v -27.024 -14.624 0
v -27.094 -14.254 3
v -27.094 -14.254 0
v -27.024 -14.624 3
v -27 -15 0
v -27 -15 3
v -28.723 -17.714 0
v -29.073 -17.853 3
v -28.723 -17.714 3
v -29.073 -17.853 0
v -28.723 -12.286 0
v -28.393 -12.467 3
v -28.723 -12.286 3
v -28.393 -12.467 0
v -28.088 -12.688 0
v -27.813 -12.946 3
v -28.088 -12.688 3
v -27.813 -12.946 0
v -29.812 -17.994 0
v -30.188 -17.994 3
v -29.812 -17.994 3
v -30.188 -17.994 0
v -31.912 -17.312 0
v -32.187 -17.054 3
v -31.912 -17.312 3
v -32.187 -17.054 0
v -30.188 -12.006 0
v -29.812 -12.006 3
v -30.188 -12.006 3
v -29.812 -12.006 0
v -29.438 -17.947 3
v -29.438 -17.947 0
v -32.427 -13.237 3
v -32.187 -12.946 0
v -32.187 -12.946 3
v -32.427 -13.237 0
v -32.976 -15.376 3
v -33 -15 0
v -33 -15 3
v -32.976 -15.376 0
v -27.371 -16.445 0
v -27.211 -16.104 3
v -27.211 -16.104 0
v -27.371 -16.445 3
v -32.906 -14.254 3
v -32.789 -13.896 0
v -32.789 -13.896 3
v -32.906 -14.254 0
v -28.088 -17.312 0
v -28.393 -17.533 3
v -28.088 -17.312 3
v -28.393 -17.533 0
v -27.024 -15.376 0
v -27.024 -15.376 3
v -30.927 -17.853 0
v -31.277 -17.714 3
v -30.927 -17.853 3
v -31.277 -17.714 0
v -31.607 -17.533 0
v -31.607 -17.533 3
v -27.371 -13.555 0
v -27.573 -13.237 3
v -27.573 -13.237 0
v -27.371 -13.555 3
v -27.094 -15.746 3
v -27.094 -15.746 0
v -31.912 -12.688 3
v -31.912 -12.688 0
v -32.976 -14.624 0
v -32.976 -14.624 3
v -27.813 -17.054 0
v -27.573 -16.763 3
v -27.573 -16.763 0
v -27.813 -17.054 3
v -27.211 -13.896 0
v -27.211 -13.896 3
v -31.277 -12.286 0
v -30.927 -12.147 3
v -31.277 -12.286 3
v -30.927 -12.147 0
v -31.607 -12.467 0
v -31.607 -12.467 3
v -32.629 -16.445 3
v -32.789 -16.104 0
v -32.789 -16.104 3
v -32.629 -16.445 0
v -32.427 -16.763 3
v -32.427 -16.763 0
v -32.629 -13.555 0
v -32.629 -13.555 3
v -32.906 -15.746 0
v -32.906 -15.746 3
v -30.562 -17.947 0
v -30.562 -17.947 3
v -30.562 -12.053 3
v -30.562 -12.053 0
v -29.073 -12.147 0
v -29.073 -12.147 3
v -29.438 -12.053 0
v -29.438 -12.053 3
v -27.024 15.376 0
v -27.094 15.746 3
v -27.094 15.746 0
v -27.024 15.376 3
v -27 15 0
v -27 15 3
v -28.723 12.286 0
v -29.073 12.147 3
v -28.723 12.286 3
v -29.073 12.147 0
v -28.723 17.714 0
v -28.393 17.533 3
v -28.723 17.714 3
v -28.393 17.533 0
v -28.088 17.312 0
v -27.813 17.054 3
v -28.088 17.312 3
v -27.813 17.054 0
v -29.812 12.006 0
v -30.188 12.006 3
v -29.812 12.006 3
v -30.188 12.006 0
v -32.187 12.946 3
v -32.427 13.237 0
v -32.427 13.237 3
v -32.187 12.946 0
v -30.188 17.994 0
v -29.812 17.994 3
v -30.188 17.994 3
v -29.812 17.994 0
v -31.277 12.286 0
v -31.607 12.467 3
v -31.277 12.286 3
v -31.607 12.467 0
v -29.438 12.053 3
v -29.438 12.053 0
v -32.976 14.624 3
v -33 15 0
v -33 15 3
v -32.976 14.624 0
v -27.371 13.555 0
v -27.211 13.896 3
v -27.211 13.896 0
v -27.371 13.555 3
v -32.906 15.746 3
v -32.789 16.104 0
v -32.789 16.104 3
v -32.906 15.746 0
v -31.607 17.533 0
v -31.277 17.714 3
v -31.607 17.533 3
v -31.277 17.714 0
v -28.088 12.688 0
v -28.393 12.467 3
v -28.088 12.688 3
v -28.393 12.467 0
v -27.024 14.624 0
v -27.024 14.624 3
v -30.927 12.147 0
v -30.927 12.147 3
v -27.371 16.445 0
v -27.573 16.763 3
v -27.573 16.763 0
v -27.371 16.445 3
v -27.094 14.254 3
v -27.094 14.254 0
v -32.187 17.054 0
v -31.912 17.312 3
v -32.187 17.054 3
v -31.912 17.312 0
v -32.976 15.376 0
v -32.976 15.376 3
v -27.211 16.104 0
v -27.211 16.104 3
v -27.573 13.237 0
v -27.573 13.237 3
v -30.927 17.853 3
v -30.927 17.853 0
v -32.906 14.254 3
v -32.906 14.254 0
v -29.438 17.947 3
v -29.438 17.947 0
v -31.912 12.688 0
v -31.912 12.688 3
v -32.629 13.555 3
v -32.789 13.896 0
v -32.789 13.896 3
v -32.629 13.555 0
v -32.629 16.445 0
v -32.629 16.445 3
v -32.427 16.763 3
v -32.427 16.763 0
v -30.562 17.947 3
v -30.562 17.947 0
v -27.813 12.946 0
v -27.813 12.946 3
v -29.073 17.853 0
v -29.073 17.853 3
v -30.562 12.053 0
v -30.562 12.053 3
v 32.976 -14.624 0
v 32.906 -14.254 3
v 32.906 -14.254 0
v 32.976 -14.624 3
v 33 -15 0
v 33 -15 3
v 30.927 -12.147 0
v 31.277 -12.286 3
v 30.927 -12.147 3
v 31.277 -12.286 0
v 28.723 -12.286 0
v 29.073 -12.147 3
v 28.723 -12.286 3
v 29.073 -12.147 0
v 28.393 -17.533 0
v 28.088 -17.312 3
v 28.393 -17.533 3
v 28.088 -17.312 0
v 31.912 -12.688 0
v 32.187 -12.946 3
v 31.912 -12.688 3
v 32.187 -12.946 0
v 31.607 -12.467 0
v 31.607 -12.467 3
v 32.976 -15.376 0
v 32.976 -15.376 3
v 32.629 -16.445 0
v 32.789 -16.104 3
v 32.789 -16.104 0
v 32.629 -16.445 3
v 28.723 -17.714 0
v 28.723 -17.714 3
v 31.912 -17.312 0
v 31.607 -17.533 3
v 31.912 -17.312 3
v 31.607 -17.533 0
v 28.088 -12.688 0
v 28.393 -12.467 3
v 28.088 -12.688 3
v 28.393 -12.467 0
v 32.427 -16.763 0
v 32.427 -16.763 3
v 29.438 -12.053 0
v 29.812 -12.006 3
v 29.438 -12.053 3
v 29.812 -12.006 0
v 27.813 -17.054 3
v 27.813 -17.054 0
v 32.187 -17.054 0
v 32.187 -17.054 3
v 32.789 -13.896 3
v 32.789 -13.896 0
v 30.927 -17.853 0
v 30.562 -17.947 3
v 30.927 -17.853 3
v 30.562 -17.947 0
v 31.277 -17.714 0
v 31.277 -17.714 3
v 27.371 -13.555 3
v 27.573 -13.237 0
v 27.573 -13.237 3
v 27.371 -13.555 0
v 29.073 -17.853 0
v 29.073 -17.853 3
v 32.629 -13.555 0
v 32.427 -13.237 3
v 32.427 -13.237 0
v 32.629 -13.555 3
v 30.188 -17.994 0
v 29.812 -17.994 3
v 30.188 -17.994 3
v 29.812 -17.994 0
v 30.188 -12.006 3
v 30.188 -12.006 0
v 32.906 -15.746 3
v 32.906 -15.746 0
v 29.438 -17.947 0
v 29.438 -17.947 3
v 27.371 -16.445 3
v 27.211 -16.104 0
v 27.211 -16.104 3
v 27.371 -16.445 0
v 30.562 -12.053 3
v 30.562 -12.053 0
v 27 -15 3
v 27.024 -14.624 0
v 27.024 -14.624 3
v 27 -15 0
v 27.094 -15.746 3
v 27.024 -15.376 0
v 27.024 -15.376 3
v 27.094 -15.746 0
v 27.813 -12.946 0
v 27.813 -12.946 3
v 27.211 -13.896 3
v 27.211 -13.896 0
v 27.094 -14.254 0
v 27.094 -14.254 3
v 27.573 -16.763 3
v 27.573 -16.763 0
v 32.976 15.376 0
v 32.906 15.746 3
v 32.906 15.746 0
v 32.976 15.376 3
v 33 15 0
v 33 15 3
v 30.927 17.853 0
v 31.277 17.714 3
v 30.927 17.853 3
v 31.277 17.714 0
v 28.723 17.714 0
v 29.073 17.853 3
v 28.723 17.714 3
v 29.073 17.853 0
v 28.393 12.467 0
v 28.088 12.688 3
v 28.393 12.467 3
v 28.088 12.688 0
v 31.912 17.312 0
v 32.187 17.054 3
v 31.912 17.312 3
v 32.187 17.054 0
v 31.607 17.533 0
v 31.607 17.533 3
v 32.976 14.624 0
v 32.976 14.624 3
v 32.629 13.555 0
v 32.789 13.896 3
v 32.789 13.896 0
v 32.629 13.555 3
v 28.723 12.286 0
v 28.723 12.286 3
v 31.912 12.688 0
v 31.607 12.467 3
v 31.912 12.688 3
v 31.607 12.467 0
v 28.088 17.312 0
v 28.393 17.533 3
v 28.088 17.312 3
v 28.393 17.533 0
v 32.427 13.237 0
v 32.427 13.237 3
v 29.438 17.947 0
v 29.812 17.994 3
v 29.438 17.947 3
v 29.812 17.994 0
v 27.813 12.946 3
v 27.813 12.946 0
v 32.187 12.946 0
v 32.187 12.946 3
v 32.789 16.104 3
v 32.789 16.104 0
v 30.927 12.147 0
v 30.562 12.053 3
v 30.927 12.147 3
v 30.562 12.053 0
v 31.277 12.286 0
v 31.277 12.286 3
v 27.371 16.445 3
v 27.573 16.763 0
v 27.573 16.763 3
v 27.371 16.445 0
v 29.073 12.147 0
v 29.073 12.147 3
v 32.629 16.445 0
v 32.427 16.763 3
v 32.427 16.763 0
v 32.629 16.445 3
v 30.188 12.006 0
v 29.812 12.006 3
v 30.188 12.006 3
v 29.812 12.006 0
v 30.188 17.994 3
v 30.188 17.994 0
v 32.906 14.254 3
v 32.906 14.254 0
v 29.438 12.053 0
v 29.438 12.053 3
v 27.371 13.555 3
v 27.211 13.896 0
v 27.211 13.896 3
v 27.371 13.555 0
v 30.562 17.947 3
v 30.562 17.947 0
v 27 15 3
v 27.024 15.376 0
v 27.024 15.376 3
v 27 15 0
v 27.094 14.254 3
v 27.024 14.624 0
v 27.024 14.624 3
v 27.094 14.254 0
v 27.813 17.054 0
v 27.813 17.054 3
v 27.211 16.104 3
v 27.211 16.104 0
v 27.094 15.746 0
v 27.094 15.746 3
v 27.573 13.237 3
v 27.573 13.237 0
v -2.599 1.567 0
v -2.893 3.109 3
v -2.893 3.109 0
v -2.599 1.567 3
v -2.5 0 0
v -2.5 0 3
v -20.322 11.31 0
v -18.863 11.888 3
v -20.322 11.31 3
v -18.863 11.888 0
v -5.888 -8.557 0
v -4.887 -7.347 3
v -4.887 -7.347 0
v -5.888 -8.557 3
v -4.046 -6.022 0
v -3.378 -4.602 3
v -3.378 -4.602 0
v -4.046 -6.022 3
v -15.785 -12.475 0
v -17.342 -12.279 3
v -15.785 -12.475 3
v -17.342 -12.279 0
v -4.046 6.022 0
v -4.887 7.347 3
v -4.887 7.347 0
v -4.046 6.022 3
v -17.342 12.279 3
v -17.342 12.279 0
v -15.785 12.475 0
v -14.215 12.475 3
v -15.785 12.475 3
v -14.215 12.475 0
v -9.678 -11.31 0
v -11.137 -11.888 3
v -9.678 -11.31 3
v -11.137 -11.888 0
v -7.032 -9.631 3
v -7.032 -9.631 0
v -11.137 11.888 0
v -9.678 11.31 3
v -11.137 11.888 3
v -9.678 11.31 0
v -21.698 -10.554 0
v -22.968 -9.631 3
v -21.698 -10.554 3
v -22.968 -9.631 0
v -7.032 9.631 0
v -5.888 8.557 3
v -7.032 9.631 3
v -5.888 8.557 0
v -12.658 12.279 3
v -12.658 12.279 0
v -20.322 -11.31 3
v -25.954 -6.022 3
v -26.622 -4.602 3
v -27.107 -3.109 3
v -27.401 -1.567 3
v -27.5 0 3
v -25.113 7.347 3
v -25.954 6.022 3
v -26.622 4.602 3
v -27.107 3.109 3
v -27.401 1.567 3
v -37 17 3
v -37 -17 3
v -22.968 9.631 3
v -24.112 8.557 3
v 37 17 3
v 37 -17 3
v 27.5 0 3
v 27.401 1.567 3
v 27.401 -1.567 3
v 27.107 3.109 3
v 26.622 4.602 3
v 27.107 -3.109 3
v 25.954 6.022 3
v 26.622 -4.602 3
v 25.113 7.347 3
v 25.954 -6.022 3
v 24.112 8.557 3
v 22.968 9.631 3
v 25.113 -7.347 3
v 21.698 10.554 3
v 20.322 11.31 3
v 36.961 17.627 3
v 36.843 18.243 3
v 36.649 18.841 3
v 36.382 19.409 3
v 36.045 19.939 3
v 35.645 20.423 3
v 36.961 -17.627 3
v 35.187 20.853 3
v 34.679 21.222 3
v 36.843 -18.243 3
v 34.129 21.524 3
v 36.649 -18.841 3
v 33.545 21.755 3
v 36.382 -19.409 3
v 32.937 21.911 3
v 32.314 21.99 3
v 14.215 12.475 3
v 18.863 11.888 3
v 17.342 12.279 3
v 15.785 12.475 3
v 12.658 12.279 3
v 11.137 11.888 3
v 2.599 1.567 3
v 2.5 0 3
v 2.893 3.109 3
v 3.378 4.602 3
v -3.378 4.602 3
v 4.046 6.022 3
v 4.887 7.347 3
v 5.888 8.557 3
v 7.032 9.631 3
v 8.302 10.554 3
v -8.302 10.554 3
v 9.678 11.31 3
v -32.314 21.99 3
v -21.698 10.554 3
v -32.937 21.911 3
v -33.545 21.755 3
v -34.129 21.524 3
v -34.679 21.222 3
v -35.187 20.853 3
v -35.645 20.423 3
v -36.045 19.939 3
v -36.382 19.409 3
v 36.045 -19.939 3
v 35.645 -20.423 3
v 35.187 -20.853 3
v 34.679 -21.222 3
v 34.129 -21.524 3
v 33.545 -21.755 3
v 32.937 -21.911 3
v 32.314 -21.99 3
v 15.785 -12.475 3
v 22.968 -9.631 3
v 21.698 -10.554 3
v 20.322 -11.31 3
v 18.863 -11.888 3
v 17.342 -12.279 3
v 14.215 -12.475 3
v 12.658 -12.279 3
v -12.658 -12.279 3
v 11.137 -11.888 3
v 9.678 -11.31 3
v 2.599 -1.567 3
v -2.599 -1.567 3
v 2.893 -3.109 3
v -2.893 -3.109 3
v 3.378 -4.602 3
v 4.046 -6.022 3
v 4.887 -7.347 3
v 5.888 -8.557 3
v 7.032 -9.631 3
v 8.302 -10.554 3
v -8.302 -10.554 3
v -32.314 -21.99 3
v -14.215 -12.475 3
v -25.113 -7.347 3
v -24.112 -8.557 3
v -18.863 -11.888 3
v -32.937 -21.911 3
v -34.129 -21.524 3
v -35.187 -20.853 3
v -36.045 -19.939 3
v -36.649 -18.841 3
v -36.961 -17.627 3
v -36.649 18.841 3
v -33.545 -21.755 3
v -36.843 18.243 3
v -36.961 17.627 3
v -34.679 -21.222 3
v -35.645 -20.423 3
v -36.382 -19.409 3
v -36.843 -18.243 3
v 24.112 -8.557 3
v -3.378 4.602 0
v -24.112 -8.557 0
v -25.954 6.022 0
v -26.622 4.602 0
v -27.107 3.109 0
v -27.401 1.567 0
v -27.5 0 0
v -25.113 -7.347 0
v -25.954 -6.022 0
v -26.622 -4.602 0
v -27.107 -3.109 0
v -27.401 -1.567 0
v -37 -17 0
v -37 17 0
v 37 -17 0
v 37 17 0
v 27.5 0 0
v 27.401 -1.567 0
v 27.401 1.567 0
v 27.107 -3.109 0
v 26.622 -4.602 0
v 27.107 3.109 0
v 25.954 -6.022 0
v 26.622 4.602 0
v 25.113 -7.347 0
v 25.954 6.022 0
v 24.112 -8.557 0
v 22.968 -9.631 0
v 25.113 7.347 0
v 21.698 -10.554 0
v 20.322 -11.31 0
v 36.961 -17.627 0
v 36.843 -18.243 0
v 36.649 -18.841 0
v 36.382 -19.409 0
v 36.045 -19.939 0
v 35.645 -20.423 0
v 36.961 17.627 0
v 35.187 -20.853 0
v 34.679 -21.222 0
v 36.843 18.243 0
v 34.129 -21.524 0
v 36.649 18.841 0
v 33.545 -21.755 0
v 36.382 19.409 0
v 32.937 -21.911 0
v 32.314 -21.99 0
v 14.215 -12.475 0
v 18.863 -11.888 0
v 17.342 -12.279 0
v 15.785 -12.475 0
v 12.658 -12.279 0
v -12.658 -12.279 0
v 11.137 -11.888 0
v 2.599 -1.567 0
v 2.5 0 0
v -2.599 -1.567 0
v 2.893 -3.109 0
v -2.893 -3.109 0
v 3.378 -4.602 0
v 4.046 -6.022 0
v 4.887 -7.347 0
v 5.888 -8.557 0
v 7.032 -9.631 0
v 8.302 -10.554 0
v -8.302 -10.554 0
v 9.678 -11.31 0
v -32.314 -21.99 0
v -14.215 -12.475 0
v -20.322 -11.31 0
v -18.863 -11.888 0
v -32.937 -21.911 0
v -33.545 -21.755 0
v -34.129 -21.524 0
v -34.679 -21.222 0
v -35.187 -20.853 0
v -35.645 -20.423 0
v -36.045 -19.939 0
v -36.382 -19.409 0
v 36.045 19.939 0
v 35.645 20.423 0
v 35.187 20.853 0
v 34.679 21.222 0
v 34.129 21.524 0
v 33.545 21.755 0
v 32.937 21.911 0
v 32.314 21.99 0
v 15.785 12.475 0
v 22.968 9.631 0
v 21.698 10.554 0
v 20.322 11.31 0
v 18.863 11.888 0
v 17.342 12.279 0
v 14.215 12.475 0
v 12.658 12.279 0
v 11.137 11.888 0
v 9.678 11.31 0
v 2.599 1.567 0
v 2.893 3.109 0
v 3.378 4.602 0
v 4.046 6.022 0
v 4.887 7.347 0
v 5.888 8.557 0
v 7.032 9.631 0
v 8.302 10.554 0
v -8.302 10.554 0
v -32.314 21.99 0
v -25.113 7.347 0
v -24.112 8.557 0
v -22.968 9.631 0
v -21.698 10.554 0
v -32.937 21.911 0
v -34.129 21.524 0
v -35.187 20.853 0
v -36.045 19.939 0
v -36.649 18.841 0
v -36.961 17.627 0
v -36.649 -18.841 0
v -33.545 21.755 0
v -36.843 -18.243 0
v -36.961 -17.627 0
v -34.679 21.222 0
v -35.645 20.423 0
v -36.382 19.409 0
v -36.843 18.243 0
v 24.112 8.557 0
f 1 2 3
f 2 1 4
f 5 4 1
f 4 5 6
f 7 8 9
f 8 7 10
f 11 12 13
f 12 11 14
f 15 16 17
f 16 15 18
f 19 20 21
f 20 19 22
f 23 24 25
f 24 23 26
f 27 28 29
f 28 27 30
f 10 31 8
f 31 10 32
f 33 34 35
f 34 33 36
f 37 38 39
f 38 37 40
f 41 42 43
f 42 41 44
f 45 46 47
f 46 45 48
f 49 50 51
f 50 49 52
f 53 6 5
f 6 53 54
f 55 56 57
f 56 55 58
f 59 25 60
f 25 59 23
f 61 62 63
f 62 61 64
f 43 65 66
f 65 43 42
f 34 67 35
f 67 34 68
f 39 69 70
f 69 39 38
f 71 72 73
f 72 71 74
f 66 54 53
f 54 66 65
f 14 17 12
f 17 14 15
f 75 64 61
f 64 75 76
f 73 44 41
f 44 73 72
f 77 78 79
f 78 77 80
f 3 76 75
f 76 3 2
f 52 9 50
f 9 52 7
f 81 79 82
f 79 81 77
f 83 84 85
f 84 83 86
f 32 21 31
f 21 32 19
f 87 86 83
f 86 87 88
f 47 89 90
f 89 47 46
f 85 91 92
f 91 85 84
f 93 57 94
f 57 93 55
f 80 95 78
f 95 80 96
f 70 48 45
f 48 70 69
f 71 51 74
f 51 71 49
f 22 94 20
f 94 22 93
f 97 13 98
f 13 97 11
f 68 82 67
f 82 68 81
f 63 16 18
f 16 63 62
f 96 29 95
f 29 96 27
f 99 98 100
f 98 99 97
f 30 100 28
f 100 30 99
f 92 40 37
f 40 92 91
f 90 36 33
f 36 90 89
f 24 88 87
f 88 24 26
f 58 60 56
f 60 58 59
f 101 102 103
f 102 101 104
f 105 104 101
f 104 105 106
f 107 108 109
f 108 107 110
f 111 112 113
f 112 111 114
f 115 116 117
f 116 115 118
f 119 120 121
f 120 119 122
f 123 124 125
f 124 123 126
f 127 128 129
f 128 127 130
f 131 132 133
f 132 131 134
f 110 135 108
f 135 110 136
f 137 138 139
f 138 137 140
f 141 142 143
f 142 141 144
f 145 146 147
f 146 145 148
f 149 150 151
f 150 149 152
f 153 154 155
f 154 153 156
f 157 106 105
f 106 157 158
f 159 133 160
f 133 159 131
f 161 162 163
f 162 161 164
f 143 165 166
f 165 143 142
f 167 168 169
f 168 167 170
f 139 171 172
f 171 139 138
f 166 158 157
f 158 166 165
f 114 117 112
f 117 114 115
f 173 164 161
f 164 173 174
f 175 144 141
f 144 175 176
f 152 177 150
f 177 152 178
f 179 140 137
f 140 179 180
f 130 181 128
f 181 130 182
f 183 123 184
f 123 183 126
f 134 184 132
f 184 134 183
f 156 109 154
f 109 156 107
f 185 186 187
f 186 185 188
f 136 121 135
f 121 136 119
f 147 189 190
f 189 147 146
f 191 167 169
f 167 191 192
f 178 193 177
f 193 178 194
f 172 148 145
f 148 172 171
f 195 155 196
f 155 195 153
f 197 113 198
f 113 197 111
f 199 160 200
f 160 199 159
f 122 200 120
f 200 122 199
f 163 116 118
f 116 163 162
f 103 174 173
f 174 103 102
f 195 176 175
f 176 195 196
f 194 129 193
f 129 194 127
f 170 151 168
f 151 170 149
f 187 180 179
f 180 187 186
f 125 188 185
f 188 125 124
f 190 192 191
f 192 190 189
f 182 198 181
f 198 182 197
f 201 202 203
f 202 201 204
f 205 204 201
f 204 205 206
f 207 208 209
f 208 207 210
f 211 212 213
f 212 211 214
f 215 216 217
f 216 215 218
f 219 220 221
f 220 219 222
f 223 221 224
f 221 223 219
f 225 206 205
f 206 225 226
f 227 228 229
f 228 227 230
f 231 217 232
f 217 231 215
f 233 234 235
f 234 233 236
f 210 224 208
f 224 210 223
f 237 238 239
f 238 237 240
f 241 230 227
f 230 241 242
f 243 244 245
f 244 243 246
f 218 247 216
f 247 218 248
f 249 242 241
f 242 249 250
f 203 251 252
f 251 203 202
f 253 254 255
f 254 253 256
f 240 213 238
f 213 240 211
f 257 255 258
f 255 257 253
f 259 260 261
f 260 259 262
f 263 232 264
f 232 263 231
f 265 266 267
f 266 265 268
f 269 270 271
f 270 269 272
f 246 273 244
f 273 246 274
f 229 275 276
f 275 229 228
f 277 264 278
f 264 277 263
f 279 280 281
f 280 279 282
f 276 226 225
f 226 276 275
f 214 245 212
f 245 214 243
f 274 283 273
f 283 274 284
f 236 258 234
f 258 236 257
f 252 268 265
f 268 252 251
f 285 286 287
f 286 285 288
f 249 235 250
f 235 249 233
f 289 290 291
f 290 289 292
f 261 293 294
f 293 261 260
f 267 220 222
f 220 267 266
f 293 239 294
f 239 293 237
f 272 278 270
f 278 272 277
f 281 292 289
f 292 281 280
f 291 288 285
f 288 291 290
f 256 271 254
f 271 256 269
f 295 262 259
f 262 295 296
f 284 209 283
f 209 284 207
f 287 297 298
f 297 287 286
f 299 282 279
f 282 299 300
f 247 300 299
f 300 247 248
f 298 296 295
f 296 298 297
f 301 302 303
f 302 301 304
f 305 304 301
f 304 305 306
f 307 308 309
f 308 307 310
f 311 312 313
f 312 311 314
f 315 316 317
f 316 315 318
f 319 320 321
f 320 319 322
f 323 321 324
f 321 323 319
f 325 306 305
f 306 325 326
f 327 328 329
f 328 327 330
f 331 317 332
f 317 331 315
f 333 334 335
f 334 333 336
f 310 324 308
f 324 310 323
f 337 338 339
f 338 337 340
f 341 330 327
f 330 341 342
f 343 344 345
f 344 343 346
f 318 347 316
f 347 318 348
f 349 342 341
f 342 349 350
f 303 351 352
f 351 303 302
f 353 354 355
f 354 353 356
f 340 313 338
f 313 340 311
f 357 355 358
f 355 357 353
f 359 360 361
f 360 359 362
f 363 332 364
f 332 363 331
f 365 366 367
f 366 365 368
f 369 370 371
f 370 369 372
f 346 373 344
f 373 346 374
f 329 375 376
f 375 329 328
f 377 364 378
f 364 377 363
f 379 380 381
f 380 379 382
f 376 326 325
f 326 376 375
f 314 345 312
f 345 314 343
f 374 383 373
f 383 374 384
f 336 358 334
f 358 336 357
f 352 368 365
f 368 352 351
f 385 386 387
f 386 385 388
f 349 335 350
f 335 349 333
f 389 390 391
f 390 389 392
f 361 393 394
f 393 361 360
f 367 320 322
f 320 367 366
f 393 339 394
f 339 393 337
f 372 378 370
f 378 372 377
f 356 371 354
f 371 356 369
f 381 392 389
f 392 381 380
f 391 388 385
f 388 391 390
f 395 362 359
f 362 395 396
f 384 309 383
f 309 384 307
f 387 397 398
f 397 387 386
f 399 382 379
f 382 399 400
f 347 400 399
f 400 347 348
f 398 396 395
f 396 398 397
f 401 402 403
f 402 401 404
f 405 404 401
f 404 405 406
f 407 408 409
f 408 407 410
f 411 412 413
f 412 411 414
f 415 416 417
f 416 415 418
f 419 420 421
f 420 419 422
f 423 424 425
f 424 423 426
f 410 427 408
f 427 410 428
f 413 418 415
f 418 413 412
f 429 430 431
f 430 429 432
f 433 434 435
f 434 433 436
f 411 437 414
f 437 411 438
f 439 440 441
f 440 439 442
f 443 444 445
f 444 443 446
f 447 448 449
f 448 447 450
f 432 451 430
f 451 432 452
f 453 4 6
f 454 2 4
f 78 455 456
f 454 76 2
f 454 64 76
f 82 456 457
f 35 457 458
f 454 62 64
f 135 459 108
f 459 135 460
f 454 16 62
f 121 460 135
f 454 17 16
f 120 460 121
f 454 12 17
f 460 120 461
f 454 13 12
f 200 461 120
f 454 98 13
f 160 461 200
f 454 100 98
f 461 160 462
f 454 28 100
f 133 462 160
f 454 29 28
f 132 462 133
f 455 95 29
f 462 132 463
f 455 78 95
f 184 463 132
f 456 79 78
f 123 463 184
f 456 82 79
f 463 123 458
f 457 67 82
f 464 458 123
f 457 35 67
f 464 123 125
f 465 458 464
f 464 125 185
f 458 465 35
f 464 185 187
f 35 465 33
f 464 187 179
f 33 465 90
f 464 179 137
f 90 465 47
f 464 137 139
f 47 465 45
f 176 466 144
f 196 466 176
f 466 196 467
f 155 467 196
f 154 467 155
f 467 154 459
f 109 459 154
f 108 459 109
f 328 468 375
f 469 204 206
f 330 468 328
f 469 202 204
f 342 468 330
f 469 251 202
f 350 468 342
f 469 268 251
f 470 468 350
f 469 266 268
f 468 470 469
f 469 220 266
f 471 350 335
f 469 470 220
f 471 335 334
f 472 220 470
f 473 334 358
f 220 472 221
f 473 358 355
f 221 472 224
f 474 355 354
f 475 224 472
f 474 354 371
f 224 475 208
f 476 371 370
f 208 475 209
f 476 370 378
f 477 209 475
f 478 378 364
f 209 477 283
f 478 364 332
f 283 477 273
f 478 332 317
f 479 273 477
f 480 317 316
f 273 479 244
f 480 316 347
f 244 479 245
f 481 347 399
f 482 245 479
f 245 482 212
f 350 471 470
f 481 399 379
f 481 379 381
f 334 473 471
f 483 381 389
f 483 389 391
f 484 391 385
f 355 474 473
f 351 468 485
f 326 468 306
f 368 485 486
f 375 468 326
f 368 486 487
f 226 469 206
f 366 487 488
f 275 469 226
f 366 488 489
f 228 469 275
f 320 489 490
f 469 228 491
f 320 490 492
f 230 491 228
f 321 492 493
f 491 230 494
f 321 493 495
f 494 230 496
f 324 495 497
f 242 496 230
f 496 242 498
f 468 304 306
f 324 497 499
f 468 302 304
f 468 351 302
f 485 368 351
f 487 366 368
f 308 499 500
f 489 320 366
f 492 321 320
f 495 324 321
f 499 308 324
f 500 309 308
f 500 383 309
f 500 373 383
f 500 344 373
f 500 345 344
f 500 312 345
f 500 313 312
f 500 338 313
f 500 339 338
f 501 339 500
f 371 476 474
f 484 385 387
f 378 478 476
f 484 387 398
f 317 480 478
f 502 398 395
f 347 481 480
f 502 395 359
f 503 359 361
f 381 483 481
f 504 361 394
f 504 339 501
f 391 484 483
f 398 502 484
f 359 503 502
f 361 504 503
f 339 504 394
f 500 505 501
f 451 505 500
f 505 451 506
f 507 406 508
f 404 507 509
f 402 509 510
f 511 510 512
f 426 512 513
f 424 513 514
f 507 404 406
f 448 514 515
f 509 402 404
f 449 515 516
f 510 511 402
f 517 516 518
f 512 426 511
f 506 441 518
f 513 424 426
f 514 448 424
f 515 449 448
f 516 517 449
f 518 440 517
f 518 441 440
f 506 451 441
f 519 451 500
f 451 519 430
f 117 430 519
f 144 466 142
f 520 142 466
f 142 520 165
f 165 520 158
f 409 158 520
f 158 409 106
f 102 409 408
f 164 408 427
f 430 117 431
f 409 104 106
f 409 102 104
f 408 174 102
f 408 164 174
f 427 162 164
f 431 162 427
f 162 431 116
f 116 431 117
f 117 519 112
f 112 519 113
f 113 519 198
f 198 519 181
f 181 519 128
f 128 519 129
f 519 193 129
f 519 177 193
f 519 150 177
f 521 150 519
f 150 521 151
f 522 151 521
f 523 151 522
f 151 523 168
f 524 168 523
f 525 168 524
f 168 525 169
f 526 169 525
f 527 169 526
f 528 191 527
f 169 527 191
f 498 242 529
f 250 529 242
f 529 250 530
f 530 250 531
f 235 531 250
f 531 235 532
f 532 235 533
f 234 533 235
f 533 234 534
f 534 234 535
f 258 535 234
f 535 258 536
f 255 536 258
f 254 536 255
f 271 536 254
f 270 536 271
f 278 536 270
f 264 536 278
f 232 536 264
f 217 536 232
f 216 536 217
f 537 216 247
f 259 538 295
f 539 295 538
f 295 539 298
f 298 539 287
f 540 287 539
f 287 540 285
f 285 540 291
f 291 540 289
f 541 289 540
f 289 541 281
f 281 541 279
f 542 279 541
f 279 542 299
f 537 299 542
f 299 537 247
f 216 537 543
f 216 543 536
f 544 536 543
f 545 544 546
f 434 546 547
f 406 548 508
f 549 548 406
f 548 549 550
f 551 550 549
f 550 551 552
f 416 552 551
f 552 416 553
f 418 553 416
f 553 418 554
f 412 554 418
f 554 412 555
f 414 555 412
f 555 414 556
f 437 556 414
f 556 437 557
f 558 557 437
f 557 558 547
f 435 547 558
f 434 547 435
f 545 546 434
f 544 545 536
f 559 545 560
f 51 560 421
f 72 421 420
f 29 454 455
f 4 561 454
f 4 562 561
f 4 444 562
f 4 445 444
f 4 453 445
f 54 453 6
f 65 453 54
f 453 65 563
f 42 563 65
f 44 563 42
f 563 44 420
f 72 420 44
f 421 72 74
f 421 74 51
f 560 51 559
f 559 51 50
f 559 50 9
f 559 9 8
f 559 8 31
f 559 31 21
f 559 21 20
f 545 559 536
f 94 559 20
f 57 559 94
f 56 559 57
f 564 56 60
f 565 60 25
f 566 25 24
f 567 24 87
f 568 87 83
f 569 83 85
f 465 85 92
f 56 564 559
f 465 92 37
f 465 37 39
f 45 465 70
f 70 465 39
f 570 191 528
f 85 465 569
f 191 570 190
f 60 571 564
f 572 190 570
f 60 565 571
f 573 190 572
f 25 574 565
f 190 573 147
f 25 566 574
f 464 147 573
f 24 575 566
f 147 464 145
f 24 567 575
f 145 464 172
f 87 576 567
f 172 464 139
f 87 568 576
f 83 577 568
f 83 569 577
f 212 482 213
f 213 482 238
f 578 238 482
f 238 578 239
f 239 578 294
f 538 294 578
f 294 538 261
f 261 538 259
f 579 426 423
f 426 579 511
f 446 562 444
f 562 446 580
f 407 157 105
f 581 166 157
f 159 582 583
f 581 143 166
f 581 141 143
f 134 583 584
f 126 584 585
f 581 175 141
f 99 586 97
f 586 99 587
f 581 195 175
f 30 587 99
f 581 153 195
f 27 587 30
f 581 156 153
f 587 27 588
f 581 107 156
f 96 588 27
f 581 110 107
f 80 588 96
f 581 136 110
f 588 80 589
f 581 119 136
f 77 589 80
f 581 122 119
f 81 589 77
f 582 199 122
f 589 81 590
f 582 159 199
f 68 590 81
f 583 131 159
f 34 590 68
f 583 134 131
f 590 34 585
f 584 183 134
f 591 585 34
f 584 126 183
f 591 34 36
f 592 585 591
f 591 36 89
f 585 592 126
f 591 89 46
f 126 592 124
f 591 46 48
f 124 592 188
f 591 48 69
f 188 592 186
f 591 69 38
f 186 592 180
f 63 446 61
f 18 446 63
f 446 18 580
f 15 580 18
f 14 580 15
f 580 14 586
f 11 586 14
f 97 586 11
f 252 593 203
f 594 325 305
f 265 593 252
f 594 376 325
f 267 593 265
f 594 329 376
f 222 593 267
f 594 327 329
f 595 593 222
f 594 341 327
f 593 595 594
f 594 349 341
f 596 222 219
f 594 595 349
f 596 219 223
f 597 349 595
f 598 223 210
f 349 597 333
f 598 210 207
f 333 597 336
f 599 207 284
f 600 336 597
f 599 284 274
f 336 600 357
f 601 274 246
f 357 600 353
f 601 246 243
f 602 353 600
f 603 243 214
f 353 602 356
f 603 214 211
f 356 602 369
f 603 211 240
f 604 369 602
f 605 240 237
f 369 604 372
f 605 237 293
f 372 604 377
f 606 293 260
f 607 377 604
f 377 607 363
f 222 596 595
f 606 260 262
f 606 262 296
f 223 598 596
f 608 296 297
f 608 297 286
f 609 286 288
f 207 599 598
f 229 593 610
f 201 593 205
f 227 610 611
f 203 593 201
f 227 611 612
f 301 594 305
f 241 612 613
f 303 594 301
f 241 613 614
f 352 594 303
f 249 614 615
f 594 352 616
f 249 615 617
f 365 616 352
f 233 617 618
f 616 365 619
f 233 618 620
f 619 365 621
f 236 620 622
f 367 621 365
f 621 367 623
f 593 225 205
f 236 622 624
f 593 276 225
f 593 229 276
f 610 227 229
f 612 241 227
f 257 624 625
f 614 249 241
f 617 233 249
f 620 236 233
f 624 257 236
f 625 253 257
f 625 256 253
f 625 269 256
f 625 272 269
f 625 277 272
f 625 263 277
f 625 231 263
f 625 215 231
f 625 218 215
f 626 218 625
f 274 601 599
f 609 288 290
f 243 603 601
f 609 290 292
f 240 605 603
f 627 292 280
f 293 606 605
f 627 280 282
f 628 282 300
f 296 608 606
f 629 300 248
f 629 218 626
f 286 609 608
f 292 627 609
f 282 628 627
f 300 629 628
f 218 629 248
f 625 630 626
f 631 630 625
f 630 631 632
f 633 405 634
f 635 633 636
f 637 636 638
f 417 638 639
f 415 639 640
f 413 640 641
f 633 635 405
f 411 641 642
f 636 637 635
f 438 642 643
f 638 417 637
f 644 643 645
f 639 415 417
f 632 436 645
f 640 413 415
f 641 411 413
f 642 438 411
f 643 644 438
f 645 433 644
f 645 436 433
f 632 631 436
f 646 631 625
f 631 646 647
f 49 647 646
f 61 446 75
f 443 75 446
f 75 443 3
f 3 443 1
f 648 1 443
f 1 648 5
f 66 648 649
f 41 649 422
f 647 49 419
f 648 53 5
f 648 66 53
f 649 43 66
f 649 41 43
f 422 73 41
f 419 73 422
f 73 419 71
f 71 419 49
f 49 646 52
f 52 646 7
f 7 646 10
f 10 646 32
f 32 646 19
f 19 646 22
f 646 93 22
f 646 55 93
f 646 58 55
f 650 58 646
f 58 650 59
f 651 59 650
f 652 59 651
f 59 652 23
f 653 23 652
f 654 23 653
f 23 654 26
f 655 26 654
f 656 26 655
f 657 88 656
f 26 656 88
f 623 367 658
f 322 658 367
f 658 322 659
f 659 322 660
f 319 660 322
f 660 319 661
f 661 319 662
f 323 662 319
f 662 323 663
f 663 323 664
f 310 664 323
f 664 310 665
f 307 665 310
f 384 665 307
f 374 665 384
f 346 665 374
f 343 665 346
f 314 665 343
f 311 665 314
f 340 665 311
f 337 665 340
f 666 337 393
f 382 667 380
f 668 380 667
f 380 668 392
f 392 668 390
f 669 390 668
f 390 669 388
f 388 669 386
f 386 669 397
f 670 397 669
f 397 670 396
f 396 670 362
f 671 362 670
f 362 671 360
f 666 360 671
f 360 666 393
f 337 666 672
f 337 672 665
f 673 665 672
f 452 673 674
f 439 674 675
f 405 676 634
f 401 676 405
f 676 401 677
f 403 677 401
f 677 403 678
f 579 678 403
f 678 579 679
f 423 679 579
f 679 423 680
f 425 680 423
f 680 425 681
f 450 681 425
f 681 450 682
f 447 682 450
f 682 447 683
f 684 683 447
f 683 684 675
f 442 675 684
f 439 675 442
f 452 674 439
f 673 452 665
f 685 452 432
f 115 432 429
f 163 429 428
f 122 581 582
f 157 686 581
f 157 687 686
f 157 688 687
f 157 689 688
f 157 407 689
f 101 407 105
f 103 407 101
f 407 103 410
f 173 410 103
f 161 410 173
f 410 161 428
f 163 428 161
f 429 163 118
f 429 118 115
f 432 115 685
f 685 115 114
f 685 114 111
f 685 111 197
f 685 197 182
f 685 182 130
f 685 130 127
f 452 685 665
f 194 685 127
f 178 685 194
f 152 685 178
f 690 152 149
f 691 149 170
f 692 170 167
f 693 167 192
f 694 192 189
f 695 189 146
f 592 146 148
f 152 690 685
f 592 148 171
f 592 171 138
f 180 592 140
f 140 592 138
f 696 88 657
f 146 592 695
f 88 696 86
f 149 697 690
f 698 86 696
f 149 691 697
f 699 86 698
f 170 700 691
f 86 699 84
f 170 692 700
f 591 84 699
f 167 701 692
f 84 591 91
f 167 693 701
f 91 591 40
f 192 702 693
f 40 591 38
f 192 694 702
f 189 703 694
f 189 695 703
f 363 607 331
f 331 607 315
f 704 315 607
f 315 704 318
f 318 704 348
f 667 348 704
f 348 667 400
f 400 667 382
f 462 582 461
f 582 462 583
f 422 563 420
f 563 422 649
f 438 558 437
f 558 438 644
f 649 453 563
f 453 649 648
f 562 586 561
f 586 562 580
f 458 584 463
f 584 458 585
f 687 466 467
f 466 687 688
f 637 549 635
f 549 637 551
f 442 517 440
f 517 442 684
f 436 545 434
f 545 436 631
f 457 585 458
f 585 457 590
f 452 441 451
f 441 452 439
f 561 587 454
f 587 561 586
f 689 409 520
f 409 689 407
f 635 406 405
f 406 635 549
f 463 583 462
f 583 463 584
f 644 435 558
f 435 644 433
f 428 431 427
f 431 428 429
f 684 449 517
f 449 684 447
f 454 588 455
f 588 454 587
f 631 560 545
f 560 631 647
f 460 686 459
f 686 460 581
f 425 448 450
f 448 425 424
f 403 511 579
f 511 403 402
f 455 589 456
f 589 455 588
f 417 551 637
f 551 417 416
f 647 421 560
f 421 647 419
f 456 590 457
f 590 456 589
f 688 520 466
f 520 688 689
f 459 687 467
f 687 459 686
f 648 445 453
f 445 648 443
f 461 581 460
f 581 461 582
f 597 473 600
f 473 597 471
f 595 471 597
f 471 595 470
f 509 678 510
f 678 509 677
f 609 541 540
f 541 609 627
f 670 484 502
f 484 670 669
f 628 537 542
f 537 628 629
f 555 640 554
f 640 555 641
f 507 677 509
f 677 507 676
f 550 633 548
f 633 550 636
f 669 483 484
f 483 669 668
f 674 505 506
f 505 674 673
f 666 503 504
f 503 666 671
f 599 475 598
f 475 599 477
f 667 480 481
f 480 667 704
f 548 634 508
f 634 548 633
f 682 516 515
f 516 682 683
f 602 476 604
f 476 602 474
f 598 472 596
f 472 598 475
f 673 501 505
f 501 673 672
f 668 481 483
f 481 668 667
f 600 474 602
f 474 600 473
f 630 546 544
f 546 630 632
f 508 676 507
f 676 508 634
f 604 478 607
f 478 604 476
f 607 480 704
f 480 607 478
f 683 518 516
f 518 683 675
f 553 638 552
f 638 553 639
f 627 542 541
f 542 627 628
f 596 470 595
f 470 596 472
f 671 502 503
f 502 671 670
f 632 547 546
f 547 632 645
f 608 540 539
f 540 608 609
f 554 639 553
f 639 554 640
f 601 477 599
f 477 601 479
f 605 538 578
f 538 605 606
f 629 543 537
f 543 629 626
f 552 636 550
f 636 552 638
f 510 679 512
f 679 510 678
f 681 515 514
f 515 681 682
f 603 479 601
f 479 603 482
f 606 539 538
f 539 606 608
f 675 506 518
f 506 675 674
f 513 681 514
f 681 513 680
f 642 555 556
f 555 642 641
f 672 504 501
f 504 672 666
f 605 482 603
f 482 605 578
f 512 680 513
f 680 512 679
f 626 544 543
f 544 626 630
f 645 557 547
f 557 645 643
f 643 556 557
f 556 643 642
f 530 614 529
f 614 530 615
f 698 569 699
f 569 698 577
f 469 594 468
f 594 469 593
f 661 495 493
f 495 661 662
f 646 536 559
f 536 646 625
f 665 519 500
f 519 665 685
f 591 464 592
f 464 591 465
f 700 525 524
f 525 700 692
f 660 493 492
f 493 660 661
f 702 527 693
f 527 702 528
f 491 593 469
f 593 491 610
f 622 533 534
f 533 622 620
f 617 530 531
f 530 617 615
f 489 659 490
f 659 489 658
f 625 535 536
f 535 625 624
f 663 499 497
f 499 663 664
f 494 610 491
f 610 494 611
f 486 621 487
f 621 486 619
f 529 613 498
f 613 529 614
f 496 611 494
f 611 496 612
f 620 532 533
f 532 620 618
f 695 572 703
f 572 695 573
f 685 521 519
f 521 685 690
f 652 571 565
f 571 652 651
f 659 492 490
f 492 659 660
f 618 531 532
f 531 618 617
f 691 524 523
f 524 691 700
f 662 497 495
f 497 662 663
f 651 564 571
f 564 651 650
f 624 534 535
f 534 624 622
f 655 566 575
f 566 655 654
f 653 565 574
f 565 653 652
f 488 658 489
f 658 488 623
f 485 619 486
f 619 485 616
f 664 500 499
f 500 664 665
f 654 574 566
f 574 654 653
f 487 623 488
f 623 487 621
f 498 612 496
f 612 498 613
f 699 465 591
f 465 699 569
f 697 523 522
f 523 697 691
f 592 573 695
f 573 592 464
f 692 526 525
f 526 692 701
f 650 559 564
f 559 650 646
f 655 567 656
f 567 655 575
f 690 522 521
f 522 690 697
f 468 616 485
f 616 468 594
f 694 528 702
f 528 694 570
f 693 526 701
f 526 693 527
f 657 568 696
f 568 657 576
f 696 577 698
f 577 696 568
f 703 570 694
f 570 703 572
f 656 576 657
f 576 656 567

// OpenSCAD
$fn = 50;


difference() {
	union() {
		hull() {
			translate(v = [-32.0000000000, 17.0000000000, 0]) {
				cylinder(h = 3, r = 5);
			}
			translate(v = [32.0000000000, 17.0000000000, 0]) {
				cylinder(h = 3, r = 5);
			}
			translate(v = [-32.0000000000, -17.0000000000, 0]) {
				cylinder(h = 3, r = 5);
			}
			translate(v = [32.0000000000, -17.0000000000, 0]) {
				cylinder(h = 3, r = 5);
			}
		}
	}
	union() {
		#translate(v = [-30.0000000000, -15.0000000000, -100.0000000000]) {
			cylinder(h = 200, r = 3.0000000000);
		}
		#translate(v = [-30.0000000000, 15.0000000000, -100.0000000000]) {
			cylinder(h = 200, r = 3.0000000000);
		}
		#translate(v = [30.0000000000, -15.0000000000, -100.0000000000]) {
			cylinder(h = 200, r = 3.0000000000);
		}
		#translate(v = [30.0000000000, 15.0000000000, -100.0000000000]) {
			cylinder(h = 200, r = 3.0000000000);
		}
		#translate(v = [-15.0000000000, 0, 0]) {
			cylinder(h = 3, r = 12.5000000000);
		}
		#translate(v = [15.0000000000, 0, 0]) {
			cylinder(h = 3, r = 12.5000000000);
		}
	}
}
